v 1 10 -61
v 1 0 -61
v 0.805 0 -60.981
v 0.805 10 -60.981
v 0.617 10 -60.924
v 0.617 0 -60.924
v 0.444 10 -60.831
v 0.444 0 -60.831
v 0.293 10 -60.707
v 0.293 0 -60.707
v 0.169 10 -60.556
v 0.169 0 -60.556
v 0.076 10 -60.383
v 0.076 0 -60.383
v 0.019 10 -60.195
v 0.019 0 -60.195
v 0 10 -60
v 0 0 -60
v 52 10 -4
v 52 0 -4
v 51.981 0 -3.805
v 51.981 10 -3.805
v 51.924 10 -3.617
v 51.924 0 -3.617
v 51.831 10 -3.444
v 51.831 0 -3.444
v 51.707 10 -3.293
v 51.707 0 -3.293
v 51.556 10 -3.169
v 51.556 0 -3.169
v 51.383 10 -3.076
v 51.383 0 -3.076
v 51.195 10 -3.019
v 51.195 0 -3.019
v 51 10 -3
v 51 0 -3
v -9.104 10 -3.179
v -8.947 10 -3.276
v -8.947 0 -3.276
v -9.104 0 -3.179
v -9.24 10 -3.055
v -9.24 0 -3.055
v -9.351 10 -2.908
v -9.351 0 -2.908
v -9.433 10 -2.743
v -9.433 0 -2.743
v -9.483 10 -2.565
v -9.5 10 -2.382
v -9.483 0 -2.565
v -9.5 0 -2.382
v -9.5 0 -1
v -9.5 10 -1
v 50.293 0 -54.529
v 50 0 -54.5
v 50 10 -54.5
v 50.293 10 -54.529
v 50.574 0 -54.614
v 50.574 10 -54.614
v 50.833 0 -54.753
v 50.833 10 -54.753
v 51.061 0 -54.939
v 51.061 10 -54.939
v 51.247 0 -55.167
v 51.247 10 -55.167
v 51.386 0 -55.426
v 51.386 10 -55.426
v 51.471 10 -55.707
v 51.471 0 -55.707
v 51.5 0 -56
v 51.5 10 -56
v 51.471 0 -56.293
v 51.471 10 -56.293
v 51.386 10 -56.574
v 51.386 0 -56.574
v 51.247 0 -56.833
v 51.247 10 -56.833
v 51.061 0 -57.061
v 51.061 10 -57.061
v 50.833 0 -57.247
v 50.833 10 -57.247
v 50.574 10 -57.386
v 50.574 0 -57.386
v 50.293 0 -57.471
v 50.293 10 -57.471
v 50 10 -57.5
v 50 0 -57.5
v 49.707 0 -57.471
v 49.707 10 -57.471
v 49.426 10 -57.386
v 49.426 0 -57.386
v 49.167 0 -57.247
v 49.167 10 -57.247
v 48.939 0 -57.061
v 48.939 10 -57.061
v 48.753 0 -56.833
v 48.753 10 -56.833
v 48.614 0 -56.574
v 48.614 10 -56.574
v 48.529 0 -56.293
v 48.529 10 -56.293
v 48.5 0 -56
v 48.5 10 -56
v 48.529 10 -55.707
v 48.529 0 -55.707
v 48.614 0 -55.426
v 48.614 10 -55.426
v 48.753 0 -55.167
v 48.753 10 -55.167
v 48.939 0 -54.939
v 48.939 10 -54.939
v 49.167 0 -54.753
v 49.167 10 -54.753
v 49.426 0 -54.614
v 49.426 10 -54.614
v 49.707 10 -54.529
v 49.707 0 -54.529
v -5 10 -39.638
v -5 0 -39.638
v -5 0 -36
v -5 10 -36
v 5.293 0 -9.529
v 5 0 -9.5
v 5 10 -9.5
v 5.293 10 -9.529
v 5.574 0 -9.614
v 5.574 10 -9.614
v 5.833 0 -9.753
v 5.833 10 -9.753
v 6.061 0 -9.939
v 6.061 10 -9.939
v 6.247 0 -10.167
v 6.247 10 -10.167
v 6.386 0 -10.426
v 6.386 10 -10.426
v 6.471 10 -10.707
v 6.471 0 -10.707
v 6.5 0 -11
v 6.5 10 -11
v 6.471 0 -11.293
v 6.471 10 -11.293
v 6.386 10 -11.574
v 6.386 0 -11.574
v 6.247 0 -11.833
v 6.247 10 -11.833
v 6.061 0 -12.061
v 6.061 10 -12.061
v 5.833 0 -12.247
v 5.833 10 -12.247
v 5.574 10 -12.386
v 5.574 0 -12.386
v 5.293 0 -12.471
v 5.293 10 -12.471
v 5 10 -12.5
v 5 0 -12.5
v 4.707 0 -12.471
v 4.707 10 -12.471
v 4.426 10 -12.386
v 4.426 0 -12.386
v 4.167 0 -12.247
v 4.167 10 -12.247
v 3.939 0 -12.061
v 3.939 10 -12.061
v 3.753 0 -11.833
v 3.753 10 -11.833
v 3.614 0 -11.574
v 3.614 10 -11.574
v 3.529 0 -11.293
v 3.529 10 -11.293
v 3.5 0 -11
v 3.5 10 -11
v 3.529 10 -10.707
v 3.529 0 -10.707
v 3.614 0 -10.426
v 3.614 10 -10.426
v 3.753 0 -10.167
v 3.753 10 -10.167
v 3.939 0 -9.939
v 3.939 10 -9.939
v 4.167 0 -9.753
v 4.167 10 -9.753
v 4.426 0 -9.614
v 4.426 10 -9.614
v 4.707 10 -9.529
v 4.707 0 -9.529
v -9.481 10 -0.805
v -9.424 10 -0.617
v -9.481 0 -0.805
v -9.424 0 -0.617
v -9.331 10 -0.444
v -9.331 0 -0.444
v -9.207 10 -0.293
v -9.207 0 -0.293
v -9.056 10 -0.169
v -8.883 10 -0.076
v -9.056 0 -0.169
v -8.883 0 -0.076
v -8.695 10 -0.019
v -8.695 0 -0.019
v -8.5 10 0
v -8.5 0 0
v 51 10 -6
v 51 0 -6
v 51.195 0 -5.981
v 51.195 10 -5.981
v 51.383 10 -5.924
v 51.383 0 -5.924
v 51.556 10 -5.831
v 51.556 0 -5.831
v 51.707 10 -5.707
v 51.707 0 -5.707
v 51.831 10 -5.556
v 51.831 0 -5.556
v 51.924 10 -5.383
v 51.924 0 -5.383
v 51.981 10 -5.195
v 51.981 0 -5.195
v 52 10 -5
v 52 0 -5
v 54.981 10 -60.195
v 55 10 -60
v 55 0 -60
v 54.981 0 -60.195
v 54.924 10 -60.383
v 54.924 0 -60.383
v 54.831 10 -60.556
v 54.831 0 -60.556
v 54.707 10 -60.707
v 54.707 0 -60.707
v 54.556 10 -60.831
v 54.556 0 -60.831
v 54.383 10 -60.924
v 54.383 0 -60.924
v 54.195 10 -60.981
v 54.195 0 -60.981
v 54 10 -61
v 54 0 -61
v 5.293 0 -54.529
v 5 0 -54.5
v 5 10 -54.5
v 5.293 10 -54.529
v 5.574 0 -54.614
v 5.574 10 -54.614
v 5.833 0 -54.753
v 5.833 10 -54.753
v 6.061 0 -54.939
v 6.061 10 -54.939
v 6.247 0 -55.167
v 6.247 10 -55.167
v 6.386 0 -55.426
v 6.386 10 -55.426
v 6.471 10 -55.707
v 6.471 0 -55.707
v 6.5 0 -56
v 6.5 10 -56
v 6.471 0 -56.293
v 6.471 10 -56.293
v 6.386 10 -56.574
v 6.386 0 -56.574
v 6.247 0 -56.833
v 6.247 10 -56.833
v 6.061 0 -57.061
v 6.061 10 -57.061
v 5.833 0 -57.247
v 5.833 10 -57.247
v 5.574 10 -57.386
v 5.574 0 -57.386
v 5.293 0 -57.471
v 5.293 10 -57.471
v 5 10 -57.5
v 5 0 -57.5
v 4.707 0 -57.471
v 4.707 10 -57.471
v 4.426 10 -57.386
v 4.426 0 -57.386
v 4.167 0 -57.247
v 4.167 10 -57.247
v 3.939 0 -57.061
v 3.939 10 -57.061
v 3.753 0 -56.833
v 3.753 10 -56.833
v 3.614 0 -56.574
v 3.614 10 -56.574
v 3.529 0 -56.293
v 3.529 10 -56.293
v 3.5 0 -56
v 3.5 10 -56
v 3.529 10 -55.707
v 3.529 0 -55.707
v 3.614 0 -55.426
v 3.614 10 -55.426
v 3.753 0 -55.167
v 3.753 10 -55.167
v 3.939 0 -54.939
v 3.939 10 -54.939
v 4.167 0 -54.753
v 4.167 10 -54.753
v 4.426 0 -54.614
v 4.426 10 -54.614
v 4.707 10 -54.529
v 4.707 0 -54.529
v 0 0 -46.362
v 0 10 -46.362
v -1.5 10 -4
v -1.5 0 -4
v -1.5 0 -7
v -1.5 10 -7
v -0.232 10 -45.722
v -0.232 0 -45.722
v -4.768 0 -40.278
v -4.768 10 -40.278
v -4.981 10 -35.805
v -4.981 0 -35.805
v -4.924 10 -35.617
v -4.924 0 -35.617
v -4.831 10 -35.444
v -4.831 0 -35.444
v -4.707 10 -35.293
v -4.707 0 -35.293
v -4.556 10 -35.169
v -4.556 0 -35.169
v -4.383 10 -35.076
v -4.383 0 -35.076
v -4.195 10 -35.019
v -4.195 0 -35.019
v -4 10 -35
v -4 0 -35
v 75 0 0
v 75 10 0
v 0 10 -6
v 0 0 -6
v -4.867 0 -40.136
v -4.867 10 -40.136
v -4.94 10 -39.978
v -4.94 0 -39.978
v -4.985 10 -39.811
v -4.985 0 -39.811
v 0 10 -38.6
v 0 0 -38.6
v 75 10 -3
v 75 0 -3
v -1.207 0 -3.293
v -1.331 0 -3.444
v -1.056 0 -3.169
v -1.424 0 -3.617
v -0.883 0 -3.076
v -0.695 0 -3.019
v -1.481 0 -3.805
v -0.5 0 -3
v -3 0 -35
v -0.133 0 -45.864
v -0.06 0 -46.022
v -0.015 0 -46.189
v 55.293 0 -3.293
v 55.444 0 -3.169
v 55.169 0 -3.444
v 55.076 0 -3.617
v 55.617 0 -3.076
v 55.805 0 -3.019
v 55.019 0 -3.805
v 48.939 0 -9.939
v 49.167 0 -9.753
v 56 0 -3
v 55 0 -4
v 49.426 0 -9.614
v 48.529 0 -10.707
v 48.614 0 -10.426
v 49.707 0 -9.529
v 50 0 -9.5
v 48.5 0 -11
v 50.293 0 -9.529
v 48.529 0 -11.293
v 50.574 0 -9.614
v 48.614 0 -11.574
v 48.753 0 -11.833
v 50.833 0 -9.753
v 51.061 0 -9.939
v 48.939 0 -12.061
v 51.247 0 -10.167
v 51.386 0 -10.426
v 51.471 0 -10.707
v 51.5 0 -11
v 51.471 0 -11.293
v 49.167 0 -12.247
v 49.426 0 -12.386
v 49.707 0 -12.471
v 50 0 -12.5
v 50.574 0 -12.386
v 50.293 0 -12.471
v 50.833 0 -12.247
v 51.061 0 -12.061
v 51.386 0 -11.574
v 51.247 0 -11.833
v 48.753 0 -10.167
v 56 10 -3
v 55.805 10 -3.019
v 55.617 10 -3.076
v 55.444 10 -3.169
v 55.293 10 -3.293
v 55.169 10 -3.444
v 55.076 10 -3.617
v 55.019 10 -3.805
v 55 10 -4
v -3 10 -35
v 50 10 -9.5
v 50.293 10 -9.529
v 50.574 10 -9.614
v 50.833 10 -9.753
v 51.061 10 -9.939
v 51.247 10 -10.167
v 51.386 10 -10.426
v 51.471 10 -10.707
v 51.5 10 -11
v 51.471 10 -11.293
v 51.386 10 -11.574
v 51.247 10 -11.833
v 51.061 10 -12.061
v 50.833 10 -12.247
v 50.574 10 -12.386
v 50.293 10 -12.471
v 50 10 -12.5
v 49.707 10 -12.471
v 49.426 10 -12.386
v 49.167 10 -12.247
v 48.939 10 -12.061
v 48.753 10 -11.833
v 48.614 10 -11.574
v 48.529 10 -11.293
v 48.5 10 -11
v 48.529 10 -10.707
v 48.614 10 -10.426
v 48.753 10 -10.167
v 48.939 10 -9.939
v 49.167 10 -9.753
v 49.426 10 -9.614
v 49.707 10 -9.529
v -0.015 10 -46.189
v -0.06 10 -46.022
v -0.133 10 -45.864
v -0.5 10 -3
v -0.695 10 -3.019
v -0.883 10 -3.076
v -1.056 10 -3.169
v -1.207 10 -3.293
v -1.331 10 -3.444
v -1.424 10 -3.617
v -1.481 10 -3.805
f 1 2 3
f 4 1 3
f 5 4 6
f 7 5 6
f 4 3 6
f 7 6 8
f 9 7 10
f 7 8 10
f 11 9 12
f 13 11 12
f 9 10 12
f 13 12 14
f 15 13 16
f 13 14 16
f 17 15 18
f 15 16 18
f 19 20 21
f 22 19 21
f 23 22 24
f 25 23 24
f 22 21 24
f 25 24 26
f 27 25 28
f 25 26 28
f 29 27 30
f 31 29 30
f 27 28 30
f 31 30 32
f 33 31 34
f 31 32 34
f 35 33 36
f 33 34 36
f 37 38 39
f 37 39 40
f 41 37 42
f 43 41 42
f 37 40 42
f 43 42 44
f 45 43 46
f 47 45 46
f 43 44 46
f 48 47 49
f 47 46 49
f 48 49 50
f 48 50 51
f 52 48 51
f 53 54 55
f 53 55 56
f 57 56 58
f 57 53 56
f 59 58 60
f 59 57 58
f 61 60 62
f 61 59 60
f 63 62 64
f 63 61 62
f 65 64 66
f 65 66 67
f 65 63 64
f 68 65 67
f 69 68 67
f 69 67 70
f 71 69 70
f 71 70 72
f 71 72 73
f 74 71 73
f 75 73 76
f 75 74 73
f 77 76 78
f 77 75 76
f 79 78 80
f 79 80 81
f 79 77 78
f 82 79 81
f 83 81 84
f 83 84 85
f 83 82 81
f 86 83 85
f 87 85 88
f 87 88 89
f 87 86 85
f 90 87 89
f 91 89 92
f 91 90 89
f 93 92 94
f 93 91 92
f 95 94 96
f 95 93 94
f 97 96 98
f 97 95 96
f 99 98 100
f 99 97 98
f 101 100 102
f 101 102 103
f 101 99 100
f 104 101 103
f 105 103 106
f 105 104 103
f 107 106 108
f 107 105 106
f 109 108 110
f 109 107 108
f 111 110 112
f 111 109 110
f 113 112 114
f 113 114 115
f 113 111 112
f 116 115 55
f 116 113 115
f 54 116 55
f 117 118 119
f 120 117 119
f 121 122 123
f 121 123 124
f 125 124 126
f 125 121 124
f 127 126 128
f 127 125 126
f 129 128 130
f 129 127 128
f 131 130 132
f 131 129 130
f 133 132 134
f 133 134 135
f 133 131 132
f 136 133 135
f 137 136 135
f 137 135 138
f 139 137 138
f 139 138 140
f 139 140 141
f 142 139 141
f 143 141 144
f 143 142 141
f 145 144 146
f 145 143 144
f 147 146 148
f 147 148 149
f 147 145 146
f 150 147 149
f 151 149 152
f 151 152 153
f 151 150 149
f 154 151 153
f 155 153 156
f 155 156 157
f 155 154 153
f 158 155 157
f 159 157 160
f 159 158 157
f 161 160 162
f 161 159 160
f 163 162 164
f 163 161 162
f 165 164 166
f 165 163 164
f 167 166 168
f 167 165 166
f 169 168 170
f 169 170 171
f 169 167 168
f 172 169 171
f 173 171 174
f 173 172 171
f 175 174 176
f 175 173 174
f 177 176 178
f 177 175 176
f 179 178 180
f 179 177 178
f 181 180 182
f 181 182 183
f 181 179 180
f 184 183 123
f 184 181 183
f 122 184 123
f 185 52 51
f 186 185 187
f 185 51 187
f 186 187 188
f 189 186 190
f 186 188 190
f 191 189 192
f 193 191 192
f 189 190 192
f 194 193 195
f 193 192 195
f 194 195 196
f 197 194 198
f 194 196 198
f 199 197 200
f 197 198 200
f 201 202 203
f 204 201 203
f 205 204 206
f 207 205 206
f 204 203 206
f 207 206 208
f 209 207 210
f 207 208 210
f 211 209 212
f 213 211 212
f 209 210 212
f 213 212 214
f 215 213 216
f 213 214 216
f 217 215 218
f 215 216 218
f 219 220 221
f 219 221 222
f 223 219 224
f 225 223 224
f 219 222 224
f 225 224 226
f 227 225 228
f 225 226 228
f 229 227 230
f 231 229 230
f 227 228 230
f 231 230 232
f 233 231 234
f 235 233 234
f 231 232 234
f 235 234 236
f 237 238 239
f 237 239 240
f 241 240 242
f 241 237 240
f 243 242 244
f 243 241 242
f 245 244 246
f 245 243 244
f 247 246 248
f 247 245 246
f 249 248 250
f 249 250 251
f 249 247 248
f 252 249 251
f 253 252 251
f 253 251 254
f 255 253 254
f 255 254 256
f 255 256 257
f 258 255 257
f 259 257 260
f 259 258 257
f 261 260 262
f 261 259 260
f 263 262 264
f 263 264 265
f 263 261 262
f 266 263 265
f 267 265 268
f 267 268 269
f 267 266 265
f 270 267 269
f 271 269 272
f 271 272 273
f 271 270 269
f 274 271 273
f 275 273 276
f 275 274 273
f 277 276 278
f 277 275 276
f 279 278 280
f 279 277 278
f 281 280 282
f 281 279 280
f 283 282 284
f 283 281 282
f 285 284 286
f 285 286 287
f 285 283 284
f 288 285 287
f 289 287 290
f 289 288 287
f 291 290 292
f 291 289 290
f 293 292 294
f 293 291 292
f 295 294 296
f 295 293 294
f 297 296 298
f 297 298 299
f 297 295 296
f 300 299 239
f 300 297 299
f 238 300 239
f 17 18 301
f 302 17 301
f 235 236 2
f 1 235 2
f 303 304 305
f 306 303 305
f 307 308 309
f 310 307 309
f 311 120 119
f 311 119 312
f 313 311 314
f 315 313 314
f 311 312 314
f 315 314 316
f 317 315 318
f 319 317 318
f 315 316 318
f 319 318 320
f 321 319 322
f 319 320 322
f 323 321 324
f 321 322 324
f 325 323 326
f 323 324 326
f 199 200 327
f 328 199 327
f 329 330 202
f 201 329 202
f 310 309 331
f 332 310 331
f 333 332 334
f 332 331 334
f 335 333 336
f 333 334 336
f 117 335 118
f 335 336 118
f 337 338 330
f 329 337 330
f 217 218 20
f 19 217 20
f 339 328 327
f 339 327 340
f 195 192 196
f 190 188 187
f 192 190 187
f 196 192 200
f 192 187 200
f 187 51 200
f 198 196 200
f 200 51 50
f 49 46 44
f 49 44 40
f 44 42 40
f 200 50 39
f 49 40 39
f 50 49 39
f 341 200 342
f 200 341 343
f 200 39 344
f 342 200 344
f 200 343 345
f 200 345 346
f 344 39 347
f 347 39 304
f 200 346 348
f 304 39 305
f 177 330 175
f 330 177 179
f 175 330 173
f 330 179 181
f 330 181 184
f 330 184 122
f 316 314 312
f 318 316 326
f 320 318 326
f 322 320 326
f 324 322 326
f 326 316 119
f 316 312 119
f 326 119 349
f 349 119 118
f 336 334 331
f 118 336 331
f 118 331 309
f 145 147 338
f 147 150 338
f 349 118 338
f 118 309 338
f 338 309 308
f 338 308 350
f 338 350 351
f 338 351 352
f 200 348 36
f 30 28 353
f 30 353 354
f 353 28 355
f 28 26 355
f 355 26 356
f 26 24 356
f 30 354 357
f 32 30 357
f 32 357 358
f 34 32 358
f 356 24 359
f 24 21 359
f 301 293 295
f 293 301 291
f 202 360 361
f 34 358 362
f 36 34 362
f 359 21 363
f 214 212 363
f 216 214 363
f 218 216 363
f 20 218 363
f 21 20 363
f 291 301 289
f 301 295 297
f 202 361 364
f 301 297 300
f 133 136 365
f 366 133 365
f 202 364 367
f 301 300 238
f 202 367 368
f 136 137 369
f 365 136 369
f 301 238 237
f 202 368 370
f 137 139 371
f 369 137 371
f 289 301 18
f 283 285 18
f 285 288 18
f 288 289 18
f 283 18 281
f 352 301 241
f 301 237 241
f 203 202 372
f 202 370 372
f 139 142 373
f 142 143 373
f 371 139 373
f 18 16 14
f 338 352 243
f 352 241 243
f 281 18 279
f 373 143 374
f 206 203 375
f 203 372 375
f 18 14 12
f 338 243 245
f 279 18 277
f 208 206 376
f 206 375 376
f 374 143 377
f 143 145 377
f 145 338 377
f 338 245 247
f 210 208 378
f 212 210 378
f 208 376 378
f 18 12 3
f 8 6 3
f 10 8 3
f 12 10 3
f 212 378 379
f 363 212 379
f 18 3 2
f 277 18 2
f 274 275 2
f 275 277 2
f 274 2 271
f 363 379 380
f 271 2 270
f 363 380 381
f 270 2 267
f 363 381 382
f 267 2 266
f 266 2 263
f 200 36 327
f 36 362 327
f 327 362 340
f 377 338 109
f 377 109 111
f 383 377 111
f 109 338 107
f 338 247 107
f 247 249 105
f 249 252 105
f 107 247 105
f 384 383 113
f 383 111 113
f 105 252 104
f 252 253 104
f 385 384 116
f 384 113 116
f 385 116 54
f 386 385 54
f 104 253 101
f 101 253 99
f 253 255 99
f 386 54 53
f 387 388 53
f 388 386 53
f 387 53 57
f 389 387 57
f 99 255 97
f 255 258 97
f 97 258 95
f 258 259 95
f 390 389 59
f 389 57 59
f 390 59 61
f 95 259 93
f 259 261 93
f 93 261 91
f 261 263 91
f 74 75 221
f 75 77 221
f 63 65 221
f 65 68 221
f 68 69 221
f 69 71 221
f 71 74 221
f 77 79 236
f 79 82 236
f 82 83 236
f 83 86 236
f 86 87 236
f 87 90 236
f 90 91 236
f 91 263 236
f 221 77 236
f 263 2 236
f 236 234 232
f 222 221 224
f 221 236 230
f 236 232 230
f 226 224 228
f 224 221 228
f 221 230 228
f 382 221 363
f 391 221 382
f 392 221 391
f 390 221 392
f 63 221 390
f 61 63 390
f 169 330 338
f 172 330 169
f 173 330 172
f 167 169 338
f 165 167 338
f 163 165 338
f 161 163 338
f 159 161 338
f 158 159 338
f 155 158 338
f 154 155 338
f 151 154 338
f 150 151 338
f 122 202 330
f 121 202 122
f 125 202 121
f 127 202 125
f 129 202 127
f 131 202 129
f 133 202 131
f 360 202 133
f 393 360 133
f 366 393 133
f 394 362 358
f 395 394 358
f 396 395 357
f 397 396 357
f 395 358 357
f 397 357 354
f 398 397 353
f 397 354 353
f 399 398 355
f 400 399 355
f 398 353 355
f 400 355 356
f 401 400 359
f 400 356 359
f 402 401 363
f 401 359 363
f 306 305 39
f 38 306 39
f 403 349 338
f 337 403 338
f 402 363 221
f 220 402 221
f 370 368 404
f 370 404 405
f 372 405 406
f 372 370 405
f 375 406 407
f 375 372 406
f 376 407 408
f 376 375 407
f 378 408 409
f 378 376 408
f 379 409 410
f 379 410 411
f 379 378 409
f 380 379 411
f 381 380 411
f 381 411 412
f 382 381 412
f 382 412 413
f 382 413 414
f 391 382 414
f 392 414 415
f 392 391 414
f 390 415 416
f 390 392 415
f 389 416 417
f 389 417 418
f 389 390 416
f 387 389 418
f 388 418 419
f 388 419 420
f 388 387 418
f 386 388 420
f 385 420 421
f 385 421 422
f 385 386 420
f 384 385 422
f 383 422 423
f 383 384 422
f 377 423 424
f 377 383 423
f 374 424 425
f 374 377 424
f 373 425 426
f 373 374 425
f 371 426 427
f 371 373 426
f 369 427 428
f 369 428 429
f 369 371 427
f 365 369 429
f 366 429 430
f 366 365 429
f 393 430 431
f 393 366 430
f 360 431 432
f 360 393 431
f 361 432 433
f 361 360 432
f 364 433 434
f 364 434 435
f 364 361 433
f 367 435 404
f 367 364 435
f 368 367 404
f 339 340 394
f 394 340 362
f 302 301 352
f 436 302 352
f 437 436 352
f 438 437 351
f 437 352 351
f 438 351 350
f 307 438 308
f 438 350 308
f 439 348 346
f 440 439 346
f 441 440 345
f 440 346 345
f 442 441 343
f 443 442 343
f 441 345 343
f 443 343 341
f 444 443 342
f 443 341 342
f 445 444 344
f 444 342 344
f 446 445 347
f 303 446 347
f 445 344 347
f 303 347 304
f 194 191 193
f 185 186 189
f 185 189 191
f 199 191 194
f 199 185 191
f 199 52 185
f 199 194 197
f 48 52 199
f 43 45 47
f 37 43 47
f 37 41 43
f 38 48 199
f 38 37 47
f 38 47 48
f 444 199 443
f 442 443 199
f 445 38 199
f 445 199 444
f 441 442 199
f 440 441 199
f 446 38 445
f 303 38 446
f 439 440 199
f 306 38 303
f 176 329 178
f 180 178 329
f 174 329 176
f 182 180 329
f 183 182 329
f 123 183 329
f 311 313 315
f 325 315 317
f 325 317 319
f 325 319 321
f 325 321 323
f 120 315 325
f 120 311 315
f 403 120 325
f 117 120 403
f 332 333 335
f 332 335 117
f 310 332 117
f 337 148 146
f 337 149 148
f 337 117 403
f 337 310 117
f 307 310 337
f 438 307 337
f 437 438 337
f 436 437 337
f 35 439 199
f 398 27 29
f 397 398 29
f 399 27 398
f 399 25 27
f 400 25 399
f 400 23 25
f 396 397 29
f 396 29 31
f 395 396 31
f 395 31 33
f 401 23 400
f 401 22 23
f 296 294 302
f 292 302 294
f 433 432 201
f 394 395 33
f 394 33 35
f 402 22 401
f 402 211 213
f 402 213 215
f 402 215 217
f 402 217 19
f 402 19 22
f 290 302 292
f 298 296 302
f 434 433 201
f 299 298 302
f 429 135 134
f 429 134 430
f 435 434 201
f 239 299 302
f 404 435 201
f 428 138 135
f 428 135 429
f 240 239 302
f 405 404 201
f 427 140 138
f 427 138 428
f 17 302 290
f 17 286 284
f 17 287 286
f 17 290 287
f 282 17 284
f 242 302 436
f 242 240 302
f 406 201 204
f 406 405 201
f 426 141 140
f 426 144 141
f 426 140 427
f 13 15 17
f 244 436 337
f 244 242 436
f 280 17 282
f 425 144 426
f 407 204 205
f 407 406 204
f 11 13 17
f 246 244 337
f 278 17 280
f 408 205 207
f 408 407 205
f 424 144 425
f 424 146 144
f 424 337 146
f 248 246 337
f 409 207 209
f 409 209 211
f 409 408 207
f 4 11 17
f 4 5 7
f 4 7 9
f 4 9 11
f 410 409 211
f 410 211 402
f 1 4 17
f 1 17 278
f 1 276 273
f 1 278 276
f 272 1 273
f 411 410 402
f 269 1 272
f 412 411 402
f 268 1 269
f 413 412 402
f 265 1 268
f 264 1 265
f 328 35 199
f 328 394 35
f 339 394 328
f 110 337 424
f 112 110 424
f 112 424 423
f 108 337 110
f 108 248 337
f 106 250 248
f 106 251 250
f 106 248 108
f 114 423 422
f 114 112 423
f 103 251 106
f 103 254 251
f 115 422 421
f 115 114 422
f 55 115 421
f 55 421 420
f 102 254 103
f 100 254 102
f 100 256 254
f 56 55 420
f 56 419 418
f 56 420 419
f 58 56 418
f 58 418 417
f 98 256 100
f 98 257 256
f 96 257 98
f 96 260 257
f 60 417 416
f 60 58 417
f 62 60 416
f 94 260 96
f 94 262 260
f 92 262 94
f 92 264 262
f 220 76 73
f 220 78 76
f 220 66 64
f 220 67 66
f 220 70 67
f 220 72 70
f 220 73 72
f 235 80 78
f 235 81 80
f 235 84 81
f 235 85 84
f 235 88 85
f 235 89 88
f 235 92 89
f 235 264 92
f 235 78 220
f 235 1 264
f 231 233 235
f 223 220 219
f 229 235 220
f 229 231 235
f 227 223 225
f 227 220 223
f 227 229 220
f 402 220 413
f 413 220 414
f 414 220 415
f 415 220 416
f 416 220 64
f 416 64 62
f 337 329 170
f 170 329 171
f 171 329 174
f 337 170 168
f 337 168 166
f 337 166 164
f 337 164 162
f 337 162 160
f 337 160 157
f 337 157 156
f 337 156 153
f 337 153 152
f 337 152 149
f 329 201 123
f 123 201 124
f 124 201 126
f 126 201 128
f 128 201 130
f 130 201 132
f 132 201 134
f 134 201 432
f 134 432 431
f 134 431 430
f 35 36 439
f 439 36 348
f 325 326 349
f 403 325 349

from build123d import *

# Parameters (mm, degrees)
SKETCH1_R           = 1.5
BOSS_EXTRUDE1_DEPTH = 10


with BuildPart() as part:
    # Sketch1 → Boss-Extrude1 (new body)
    with BuildSketch(Plane(origin=(0, 0, 0), x_dir=(1, 0, 0), z_dir=(0, 1, 0))):
        with BuildLine():
            Line((55, 4), (55, 60))
            ThreePointArc((55, 60), (54.707106781, 60.707106781), (54, 61))
            Line((54, 61), (1, 61))
            ThreePointArc((1, 61), (0.292893219, 60.707106781), (0, 60))
            Line((0, 60), (0, 46.362049935))
            ThreePointArc((0, 46.362049935), (-0.059728422, 46.021624671), (-0.23177872, 45.721865536))
            Line((-0.23177872, 45.721865536), (-4.76822128, 40.278134464))
            ThreePointArc((-4.76822128, 40.278134464), (-4.940271578, 39.978375329), (-5, 39.637950065))
            Line((-5, 39.637950065), (-5, 36))
            ThreePointArc((-5, 36), (-4.707106781, 35.292893219), (-4, 35))
            Line((-4, 35), (-3, 35))
            Line((-3, 35), (0, 38.6))
            Line((0, 38.6), (0, 6))
            Line((0, 6), (51, 6))
            ThreePointArc((51, 6), (51.707106781, 5.707106781), (52, 5))
            Line((52, 5), (52, 4))
            ThreePointArc((52, 4), (51.707106781, 3.292893219), (51, 3))
            Line((51, 3), (-0.5, 3))
            ThreePointArc((-0.5, 3), (-1.207106781, 3.292893219), (-1.5, 4))
            Line((-1.5, 4), (-1.5, 7))
            Line((-1.5, 7), (-8.947213595, 3.276393202))
            ThreePointArc((-8.947213595, 3.276393202), (-9.350650808, 2.907697123), (-9.5, 2.381966011))
            Line((-9.5, 2.381966011), (-9.5, 1))
            ThreePointArc((-9.5, 1), (-9.207106781, 0.292893219), (-8.5, 0))
            Line((-8.5, 0), (75, 0))
            Line((75, 0), (75, 3))
            Line((75, 3), (56, 3))
            ThreePointArc((56, 3), (55.292893219, 3.292893219), (55, 4))
        make_face()
        with Locations(Location((5, 56, 0), (0, 0, 270))):
            Circle(SKETCH1_R, mode=Mode.SUBTRACT)
        with Locations(Location((50, 56, 0), (0, 0, 270))):
            Circle(SKETCH1_R, mode=Mode.SUBTRACT)
        with Locations(Location((5, 11, 0), (0, 0, 270))):
            Circle(SKETCH1_R, mode=Mode.SUBTRACT)
        with Locations(Location((50, 11, 0), (0, 0, 270))):
            Circle(SKETCH1_R, mode=Mode.SUBTRACT)
    extrude(amount=BOSS_EXTRUDE1_DEPTH)


solid = part.part
